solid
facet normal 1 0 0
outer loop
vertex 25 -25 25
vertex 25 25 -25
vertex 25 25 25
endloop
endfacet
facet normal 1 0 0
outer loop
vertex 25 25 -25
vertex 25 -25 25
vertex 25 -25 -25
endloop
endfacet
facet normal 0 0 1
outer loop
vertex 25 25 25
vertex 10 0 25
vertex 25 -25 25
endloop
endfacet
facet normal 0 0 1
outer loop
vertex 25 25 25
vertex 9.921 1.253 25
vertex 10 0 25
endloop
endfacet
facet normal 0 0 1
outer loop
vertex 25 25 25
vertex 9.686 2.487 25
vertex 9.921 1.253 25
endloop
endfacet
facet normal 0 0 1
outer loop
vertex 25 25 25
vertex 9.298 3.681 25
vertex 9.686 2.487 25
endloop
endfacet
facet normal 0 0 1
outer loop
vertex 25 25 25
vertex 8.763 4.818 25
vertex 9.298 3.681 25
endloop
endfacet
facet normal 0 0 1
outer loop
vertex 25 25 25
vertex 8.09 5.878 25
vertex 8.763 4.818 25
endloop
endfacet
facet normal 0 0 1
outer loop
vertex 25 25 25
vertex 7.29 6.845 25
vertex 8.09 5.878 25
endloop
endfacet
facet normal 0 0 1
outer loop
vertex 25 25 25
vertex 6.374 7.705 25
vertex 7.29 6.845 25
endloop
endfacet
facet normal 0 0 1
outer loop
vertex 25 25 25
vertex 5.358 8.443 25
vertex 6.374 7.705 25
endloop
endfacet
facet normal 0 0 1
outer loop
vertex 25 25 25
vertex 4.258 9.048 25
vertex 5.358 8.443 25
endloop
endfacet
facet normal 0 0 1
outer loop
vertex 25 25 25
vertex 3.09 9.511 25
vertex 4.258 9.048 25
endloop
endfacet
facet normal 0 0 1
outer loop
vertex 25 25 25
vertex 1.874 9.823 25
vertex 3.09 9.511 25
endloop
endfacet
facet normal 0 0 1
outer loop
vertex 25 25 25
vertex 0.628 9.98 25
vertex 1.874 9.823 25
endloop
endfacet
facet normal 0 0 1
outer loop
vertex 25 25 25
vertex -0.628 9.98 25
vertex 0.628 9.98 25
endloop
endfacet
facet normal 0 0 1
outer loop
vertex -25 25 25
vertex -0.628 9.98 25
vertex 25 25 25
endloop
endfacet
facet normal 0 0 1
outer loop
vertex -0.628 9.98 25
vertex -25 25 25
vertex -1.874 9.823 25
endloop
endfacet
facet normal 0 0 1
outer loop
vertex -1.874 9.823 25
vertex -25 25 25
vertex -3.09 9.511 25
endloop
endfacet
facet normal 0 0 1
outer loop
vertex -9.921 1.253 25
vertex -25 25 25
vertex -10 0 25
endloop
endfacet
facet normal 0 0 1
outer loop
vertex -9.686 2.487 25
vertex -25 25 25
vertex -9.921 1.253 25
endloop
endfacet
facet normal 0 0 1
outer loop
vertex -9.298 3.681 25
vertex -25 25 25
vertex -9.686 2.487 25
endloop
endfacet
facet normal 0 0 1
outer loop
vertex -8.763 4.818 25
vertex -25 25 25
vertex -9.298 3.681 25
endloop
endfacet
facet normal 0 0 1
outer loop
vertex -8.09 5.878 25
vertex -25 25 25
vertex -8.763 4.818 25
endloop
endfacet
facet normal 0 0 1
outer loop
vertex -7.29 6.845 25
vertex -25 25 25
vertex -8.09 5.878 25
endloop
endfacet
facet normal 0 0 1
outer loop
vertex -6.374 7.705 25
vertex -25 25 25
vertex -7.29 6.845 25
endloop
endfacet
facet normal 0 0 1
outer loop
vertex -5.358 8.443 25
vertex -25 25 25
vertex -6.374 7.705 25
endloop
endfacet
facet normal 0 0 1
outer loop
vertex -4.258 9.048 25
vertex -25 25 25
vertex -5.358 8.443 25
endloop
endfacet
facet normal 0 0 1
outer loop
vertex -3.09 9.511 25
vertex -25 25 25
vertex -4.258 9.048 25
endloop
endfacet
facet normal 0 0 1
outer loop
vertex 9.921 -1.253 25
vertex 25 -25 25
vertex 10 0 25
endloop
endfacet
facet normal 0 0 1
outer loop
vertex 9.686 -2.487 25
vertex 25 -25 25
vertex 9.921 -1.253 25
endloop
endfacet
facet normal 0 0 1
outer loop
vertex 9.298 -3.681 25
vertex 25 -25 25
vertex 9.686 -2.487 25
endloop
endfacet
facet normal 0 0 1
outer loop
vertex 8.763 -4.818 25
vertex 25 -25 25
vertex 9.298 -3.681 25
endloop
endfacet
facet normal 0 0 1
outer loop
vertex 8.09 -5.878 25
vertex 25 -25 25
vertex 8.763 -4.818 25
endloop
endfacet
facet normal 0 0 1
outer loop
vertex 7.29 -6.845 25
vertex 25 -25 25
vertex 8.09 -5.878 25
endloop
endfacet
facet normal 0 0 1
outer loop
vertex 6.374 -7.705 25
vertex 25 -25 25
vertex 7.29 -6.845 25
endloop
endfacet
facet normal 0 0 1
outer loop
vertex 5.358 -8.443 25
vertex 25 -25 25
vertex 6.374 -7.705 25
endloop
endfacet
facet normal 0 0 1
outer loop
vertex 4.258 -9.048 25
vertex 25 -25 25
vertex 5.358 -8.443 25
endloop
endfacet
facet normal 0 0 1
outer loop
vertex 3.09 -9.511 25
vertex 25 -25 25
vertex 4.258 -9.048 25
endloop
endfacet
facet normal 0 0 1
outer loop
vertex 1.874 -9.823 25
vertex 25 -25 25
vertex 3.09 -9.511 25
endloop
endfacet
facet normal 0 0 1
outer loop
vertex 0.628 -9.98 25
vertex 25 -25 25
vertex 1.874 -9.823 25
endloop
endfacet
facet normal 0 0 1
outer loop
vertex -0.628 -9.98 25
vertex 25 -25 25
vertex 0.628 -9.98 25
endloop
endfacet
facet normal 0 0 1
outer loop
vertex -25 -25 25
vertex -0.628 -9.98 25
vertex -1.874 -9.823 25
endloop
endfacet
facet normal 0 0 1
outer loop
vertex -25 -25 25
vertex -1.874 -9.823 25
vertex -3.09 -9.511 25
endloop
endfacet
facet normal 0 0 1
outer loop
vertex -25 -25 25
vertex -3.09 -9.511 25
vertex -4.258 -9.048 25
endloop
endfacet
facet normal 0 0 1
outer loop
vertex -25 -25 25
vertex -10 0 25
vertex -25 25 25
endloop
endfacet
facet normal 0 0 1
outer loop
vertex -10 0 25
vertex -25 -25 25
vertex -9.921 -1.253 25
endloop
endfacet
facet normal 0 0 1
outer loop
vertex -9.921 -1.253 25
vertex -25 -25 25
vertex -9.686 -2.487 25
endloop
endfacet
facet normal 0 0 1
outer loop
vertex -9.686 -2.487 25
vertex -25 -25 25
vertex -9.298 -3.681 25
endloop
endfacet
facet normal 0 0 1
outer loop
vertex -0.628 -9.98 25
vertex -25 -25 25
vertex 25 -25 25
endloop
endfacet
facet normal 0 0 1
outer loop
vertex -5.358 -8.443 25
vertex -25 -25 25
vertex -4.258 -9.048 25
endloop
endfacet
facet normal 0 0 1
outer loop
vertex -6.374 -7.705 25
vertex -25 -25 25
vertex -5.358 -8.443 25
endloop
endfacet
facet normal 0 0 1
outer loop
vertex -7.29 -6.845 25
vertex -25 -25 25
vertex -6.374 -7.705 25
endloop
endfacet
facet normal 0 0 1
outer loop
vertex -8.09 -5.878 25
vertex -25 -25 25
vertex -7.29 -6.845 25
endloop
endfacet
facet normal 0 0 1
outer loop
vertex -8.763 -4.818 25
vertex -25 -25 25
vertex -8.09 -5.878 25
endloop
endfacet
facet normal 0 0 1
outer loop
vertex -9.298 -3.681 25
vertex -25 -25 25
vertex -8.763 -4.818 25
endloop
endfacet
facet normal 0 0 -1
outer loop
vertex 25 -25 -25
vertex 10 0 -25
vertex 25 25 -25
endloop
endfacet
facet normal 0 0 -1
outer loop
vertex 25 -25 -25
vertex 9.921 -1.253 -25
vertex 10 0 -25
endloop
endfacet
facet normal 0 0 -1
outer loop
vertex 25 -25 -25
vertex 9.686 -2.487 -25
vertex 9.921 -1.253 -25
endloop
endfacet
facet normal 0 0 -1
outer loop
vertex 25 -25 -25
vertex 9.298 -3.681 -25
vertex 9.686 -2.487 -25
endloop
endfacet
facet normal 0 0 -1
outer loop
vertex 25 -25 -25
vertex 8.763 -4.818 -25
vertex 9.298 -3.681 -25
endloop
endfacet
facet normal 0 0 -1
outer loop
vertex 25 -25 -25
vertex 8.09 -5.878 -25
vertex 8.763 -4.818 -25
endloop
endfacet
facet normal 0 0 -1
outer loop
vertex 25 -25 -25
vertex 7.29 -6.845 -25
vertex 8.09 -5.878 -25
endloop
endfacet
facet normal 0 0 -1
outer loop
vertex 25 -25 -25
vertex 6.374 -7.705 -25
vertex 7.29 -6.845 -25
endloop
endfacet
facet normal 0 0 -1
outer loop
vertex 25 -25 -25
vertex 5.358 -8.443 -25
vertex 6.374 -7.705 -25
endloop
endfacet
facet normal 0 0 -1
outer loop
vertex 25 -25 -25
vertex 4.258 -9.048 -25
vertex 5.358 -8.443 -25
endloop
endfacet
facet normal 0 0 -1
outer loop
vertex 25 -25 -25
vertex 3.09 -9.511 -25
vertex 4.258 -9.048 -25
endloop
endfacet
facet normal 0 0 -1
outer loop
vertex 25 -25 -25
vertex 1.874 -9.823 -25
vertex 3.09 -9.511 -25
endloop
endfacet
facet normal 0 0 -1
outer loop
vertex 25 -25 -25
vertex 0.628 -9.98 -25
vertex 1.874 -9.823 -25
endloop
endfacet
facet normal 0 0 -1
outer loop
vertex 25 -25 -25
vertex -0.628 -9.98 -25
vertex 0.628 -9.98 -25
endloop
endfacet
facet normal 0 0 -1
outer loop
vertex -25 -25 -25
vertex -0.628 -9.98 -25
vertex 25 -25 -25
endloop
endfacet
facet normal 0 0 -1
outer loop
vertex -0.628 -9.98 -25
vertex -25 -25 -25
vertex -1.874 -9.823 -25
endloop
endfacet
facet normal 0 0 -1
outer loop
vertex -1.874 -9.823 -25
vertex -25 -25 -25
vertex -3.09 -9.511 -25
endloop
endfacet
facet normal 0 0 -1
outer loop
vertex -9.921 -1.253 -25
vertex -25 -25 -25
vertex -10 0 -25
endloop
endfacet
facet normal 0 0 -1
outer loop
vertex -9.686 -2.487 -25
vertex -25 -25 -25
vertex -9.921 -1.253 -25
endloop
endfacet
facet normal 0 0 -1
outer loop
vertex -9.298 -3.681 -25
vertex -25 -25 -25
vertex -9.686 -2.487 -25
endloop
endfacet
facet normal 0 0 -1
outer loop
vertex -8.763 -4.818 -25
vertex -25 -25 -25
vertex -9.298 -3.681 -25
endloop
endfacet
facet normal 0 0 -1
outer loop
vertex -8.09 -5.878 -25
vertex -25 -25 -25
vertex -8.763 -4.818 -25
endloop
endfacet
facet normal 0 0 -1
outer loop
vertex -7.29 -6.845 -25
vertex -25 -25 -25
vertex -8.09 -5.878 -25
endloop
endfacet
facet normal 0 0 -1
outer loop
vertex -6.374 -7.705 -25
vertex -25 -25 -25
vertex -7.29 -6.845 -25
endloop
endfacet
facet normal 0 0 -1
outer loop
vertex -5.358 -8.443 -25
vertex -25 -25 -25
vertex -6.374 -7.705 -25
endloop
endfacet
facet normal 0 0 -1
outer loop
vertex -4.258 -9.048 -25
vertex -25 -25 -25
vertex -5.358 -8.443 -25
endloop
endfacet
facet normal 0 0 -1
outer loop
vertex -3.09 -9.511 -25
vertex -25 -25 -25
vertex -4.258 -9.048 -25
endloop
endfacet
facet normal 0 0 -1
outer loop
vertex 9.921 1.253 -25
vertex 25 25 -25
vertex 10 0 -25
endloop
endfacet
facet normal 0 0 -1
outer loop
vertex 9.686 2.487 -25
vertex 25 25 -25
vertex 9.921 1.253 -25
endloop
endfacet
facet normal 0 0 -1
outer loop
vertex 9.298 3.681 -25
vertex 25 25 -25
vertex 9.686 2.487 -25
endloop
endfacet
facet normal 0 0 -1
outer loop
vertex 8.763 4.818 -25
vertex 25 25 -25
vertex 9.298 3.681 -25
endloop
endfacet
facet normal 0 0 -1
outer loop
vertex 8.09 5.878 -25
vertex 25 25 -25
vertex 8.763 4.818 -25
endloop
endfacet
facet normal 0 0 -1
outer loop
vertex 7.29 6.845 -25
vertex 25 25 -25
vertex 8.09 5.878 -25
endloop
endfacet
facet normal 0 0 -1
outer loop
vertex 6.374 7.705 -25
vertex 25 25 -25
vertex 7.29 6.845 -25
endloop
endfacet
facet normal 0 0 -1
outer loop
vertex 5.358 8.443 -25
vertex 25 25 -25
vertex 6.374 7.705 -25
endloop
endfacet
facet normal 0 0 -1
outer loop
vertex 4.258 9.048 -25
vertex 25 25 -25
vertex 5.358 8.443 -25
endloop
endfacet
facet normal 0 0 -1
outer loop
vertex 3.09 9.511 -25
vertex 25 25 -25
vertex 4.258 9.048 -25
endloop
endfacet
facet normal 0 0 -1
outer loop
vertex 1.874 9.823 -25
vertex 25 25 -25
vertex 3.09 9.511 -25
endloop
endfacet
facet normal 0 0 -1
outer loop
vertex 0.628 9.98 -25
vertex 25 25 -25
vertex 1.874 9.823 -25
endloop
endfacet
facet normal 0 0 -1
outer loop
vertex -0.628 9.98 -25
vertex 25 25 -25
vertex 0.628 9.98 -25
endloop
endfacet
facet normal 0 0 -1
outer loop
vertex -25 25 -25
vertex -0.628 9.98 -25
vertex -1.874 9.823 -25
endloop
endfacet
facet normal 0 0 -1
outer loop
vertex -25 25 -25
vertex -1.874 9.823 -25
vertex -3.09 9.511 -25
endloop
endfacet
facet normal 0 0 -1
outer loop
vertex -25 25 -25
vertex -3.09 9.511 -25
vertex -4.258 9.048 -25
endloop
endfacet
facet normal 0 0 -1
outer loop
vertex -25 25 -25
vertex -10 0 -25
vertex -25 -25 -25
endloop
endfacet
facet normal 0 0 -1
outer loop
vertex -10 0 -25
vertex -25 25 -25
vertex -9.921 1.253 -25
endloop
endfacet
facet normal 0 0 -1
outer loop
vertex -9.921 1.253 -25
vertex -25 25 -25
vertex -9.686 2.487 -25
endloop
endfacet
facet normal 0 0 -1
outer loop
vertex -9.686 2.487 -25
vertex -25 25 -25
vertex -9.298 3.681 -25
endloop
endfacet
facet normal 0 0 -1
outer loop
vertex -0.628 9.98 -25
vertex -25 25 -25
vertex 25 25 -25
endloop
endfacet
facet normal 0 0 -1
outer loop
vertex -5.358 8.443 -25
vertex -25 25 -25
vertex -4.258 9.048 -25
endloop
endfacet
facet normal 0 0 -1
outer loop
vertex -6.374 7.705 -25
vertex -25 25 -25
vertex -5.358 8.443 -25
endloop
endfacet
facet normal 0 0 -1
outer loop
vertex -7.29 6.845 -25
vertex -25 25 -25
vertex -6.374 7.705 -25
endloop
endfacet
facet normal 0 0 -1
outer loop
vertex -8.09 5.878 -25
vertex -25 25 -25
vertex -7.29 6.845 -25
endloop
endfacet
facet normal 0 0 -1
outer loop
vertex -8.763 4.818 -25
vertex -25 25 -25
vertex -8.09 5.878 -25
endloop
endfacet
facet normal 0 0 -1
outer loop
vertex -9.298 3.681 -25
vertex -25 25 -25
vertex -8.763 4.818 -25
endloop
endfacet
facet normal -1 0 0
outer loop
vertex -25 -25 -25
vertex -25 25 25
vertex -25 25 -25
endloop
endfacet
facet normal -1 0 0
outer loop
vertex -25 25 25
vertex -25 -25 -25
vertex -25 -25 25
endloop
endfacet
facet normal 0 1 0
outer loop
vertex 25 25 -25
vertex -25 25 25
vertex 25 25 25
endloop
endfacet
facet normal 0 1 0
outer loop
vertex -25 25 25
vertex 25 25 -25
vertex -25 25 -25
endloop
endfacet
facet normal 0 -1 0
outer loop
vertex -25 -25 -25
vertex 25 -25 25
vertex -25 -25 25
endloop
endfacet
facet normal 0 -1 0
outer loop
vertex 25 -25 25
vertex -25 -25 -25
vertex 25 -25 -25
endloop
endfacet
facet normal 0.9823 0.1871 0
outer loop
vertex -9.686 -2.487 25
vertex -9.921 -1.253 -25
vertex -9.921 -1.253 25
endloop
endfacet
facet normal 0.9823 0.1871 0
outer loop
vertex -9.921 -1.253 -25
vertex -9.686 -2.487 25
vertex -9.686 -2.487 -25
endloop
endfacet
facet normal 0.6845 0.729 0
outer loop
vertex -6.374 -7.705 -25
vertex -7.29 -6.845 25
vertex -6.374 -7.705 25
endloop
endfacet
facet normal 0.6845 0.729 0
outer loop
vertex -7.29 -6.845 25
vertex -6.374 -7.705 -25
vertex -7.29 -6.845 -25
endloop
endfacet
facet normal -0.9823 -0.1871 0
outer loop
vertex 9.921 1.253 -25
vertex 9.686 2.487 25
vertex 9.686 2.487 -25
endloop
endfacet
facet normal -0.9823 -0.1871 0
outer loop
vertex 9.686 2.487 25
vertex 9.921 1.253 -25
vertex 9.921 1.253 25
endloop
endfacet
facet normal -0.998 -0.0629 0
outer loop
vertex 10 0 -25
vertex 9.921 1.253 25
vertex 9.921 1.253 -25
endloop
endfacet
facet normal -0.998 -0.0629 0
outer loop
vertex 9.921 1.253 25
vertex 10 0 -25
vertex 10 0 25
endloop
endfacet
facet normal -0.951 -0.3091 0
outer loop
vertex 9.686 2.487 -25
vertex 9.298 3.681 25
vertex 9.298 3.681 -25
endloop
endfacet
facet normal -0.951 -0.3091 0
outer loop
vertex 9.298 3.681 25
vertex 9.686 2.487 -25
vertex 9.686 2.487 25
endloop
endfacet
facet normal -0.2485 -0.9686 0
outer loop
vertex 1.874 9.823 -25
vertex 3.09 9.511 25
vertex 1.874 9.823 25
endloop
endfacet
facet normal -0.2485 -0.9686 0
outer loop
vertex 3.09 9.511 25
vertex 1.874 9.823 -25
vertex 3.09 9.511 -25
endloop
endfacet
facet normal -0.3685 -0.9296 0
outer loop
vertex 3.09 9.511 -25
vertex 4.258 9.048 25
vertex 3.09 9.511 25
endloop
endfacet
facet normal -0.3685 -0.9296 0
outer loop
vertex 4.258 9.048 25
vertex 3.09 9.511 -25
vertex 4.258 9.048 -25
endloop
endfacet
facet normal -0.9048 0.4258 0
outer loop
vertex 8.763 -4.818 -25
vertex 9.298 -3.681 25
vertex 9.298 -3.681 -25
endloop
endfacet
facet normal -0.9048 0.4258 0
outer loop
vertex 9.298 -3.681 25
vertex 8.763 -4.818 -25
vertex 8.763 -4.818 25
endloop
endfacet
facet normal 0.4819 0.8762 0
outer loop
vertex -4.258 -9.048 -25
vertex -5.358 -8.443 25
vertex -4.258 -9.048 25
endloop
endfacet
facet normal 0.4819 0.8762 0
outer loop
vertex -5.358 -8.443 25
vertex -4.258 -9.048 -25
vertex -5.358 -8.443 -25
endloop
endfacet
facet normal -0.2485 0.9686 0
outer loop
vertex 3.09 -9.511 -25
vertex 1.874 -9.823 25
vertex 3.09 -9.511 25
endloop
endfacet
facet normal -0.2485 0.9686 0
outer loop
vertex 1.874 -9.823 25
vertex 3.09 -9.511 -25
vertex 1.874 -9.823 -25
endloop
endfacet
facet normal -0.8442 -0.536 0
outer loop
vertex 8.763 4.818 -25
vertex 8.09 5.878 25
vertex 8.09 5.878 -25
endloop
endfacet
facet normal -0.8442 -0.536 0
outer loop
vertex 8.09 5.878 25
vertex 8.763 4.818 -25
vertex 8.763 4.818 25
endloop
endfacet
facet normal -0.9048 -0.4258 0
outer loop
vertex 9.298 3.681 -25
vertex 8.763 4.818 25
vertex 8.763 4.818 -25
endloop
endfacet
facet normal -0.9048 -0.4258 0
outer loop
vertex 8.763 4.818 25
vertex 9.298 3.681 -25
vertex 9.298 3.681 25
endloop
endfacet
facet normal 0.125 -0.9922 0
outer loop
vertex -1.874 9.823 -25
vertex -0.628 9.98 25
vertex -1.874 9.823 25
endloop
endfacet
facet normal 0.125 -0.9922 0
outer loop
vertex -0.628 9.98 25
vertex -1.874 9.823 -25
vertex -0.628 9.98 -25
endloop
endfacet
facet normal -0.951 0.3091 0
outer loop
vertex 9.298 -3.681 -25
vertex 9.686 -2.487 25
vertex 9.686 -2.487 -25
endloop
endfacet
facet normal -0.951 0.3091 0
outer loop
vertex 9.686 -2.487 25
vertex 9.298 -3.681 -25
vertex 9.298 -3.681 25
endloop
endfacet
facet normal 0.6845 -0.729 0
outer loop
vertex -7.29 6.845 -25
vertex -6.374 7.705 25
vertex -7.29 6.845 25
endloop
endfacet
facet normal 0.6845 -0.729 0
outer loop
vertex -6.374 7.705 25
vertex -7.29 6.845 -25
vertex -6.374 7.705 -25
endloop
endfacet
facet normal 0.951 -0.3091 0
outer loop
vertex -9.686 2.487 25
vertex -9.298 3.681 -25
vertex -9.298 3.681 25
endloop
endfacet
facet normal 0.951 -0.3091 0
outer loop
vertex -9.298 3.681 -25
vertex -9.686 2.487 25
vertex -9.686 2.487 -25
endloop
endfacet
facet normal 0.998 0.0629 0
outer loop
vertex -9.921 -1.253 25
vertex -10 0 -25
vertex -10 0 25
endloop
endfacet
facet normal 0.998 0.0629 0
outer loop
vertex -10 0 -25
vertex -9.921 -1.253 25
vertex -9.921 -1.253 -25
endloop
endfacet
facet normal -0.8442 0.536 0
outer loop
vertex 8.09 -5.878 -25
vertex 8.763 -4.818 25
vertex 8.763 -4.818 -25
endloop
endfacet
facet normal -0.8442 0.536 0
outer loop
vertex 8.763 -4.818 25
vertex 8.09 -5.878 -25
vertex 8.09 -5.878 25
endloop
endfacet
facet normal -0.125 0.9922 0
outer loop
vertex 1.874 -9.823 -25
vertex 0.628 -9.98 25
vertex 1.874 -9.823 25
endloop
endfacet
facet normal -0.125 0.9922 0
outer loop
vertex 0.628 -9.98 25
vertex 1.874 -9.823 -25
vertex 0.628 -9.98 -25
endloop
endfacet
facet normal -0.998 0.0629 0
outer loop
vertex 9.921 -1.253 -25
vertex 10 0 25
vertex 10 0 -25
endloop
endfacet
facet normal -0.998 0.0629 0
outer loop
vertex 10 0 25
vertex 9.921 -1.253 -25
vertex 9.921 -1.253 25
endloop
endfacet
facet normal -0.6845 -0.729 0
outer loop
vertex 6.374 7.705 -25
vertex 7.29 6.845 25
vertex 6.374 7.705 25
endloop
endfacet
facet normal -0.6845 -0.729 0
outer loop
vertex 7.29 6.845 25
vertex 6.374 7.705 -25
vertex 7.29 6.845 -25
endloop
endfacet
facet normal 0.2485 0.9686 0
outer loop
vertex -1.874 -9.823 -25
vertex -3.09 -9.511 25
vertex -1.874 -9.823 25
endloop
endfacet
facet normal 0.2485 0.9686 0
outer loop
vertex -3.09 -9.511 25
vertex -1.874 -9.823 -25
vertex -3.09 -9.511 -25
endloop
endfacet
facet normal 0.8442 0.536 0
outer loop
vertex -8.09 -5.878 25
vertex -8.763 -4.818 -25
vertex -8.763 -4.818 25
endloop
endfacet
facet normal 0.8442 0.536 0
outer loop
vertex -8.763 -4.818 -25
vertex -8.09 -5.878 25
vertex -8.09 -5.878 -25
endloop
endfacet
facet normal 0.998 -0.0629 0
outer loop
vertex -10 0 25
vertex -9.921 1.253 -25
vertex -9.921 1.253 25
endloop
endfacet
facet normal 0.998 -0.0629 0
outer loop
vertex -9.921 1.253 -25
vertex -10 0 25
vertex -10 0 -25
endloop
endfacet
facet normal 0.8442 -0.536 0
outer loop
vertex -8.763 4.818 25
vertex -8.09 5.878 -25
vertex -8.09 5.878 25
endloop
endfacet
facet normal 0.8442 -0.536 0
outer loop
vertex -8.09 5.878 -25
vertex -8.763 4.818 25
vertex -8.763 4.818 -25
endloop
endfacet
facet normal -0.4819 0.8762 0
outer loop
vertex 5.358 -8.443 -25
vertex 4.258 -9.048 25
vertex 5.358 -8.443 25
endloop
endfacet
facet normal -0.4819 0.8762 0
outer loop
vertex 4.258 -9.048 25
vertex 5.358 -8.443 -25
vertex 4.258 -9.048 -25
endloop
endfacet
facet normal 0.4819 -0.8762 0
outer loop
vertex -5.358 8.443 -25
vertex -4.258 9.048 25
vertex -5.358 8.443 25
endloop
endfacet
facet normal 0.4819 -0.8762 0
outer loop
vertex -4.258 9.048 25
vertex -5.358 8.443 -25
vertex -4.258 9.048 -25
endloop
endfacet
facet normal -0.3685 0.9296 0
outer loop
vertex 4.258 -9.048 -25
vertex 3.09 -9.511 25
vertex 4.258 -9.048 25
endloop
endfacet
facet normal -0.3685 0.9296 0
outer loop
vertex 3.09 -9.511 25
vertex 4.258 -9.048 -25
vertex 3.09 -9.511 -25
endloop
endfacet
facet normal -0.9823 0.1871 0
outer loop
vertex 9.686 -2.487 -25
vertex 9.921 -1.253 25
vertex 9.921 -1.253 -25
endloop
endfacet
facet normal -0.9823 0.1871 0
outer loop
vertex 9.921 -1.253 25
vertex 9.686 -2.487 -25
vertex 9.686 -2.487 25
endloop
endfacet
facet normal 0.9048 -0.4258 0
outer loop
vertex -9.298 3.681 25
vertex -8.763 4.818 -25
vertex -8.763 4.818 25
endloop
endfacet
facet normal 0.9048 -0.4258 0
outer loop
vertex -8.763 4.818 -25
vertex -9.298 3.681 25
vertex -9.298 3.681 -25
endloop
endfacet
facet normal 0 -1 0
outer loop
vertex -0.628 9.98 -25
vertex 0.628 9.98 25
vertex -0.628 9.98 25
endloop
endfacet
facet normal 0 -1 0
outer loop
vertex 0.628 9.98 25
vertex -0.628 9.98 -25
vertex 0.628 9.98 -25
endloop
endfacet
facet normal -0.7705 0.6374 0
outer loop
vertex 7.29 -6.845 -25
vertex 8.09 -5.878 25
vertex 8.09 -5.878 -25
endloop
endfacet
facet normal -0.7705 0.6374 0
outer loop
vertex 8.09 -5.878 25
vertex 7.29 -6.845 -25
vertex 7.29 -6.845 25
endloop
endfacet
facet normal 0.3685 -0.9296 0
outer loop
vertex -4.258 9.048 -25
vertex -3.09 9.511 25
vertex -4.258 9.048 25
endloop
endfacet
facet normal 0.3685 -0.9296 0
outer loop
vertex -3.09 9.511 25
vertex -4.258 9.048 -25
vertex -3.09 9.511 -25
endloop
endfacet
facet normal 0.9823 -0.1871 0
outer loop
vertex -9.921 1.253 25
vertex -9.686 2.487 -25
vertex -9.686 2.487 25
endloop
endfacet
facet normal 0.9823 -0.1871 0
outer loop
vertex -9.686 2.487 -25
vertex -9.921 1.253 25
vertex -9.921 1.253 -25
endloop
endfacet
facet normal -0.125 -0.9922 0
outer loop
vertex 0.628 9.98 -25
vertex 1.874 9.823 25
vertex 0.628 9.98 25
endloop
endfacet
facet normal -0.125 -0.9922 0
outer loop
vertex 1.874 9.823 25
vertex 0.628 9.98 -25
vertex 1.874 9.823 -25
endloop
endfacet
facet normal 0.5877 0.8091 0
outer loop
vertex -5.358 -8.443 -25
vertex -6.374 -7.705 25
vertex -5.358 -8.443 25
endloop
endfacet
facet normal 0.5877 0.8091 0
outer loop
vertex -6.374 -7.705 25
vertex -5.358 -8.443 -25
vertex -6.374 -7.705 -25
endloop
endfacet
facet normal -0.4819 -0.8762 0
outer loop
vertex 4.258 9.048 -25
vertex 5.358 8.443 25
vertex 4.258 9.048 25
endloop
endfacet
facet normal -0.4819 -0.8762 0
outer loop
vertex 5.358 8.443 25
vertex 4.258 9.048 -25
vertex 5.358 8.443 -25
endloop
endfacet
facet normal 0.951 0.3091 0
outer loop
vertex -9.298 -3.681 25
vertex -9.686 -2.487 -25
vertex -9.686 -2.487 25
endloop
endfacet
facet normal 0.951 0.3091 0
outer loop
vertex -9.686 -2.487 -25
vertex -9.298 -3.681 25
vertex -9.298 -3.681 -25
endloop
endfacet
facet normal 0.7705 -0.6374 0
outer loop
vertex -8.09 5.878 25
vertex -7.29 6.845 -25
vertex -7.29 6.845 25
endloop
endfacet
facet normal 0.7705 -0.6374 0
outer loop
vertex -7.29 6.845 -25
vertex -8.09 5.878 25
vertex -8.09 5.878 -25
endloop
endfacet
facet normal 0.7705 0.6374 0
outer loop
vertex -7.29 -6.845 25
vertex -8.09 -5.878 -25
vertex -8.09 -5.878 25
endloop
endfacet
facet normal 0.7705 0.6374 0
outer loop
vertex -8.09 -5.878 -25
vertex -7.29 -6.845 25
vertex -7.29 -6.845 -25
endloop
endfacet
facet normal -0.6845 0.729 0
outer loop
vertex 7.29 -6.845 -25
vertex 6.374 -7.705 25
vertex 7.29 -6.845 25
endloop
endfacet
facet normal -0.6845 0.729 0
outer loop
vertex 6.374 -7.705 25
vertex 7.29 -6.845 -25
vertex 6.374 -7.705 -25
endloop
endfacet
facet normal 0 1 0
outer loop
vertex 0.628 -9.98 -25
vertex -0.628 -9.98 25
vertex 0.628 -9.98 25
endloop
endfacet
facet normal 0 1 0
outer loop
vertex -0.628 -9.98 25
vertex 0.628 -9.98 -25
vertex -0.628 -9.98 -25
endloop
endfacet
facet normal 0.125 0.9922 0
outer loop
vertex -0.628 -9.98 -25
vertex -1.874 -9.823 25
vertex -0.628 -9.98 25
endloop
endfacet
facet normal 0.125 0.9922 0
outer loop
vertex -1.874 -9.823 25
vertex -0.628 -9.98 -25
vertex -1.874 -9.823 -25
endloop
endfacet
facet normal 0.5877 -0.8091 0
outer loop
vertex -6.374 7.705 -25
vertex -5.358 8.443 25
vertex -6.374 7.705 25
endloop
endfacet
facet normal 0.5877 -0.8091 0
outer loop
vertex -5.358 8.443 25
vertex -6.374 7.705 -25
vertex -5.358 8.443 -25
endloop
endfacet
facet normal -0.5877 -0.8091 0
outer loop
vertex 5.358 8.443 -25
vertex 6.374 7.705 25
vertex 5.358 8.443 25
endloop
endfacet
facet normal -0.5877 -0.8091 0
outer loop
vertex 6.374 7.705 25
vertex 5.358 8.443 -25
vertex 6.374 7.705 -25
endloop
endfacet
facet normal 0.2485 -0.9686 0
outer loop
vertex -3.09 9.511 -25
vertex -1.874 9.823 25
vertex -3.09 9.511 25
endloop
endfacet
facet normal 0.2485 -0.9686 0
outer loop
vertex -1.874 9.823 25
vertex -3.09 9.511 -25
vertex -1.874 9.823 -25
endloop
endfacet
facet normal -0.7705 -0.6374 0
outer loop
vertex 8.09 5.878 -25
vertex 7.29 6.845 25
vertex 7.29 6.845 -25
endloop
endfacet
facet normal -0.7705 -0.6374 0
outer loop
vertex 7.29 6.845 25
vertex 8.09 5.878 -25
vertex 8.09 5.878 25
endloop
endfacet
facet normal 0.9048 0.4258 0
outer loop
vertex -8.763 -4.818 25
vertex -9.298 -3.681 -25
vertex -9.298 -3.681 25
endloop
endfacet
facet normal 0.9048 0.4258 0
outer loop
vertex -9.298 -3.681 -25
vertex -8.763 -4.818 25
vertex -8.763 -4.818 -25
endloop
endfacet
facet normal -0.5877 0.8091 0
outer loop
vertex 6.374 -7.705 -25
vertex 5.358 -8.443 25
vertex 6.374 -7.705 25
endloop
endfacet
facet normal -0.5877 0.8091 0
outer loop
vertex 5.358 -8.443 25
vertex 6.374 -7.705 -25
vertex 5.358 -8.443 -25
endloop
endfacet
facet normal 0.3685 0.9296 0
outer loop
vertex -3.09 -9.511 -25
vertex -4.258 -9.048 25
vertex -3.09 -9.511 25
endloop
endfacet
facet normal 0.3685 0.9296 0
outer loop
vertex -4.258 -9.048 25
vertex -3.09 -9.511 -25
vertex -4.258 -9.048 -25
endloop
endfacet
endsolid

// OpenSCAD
difference() {
    cube([50, 50, 50], center=true);
    cylinder(h=51, d=20, center=true, $fn=50);
}
